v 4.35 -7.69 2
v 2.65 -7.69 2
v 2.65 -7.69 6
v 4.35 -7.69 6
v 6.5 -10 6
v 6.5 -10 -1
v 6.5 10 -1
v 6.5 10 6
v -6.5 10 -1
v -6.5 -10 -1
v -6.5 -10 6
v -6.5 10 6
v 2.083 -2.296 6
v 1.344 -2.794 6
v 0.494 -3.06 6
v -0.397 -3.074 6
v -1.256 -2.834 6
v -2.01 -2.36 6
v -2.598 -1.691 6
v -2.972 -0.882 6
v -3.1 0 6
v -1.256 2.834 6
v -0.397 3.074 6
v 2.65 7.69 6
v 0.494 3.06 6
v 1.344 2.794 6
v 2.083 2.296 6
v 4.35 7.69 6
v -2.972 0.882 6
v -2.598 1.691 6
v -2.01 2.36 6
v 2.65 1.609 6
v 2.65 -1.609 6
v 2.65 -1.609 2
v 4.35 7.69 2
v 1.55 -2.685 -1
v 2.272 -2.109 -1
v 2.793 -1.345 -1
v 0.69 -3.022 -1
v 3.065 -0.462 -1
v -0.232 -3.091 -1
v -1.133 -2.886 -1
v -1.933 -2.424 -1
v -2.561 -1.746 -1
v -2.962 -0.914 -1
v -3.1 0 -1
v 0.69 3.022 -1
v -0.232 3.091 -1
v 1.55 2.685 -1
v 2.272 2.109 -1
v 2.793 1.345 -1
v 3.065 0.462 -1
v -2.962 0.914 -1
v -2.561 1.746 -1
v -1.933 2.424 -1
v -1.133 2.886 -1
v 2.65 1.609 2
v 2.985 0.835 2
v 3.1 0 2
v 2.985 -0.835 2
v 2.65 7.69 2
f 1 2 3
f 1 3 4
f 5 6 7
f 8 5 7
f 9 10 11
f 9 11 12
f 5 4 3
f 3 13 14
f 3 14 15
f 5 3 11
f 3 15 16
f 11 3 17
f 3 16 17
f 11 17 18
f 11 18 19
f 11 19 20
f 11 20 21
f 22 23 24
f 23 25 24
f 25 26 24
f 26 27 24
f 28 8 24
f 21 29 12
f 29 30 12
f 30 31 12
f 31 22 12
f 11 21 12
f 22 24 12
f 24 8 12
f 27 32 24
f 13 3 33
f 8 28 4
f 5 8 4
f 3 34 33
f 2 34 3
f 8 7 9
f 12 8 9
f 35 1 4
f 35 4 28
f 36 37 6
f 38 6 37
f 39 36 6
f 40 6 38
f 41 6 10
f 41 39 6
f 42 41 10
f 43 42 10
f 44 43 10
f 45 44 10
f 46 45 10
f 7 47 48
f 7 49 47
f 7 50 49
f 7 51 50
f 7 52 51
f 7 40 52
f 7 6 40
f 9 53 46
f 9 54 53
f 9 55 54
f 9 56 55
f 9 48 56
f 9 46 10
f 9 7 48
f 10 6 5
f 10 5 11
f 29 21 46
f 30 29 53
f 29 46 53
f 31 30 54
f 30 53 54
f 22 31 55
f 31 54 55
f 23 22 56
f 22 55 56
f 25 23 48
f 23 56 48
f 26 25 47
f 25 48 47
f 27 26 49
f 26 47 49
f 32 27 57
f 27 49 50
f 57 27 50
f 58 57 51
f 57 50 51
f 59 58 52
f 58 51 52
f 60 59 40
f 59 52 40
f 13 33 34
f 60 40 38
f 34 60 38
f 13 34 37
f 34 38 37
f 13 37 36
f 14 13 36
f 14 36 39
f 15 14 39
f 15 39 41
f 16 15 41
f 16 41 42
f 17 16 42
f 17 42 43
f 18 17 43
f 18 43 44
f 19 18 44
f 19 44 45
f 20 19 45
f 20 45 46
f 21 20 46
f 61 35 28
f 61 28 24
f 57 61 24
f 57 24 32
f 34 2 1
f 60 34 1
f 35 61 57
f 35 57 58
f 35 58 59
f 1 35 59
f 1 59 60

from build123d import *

# Parameters (mm, degrees)
SKETCH2_W           = 13
SKETCH2_H           = 20
BOSS_EXTRUDE1_DEPTH = 6
BOSS_EXTRUDE2_DEPTH = 2
BOSS_EXTRUDE3_START = 1
SKETCH3_W           = 13
SKETCH3_H           = 20
SKETCH3_R           = 3.2
BOSS_EXTRUDE3_DEPTH = 1
BOSS_EXTRUDE4_DEPTH = 4
CUT_EXTRUDE1_START  = -6
CUT_EXTRUDE1_DEPTH  = 6
BOSS_EXTRUDE5_DEPTH = 2
SKETCH8_R           = 3.2
SKETCH8_R_2         = 3.1
BOSS_EXTRUDE6_DEPTH = 7
SKETCH9_W           = 1.7
SKETCH9_H           = 15.38
CUT_EXTRUDE2_DEPTH  = 4


# Read off the part's stored shape, not the designer's step: Cut-Extrude1
with BuildPart() as part:
    # Sketch2 → Boss-Extrude1 (new body)
    with BuildSketch(Plane.XY):
        Rectangle(SKETCH2_W, SKETCH2_H)
        with BuildLine():
            Line((1.3, -9.04), (1.3, -2.924038303))
            ThreePointArc((1.3, -2.924038303), (-3.2, 0), (1.3, 2.924038303))
            Line((1.3, 2.924038303), (1.3, 9.04))
            Line((1.3, 9.04), (5.7, 9.04))
            Line((5.7, 9.04), (5.7, -9.04))
            Line((5.7, -9.04), (1.3, -9.04))
        make_face(mode=Mode.SUBTRACT)
    extrude(amount=BOSS_EXTRUDE1_DEPTH)

    # Sketch2<3> → Boss-Extrude2 (add)
    with BuildSketch(Plane.XY):
        with BuildLine():
            Line((4.2, 7.54), (4.2, -7.54))
            Line((4.2, -7.54), (2.8, -7.54))
            Line((2.8, -7.54), (2.8, -1.549193338))
            ThreePointArc((2.8, -1.549193338), (2.162186317, -2.359014695), (1.3, -2.924038303))
            Line((1.3, -2.924038303), (1.3, -9.04))
            Line((1.3, -9.04), (5.7, -9.04))
            Line((5.7, -9.04), (5.7, 9.04))
            Line((5.7, 9.04), (1.3, 9.04))
            Line((1.3, 9.04), (1.3, 2.924038303))
            ThreePointArc((1.3, 2.924038303), (2.162186317, 2.359014695), (2.8, 1.549193338))
            Line((2.8, 1.549193338), (2.8, 7.54))
            Line((2.8, 7.54), (4.2, 7.54))
        make_face()
    extrude(amount=BOSS_EXTRUDE2_DEPTH)

    # Sketch3 → Boss-Extrude3 (add)
    with BuildSketch(Plane(origin=(0, 0, 0), x_dir=(-1, 0, 0), z_dir=(0, 0, -1)).offset(BOSS_EXTRUDE3_START)):
        Rectangle(SKETCH3_W, SKETCH3_H)
        Circle(SKETCH3_R, mode=Mode.SUBTRACT)
    extrude(amount=-BOSS_EXTRUDE3_DEPTH)

    # Sketch4 → Boss-Extrude4 (add)
    with BuildSketch(Plane.XY.offset(2)):
        with BuildLine():
            Line((2.8, 1.549193338), (2.8, 7.54))
            Line((2.8, 7.54), (4.2, 7.54))
            Line((4.2, 7.54), (4.2, -7.54))
            Line((4.2, -7.54), (2.8, -7.54))
            Line((2.8, -7.54), (2.8, -1.549193338))
            ThreePointArc((2.8, -1.549193338), (2.162186317, -2.359014695), (1.3, -2.924038303))
            Line((1.3, -2.924038303), (1.3, -9.04))
            Line((1.3, -9.04), (5.7, -9.04))
            Line((5.7, -9.04), (5.7, 9.04))
            Line((5.7, 9.04), (1.3, 9.04))
            Line((1.3, 9.04), (1.3, 2.924038303))
            ThreePointArc((1.3, 2.924038303), (2.162186317, 2.359014695), (2.8, 1.549193338))
        make_face()
    extrude(amount=BOSS_EXTRUDE4_DEPTH)

    # Cut-Extrude1 outline → Cut-Extrude1 (cut)
    with BuildSketch(Plane.XY.offset(6).offset(CUT_EXTRUDE1_START)):
        with BuildLine():
            Line((4.35, 7.69), (2.65, 7.69))
            Line((2.65, 7.69), (2.65, 1.793739111))
            ThreePointArc((2.65, 1.793739111), (2.727741861, 1.673148033), (2.8, 1.549193338))
            Line((2.8, 1.549193338), (2.8, 7.54))
            Line((2.8, 7.54), (4.2, 7.54))
            Line((4.2, 7.54), (4.2, -7.54))
            Line((4.2, -7.54), (2.8, -7.54))
            Line((2.8, -7.54), (2.8, -1.549193338))
            ThreePointArc((2.8, -1.549193338), (2.727741861, -1.673148033), (2.65, -1.793739111))
            Line((2.65, -1.793739111), (2.65, -7.69))
            Line((2.65, -7.69), (4.35, -7.69))
            Line((4.35, -7.69), (4.35, 7.69))
        make_face()
    extrude(amount=CUT_EXTRUDE1_DEPTH, mode=Mode.SUBTRACT)

    # Sketch7 → Boss-Extrude5 (add)
    with BuildSketch(Plane.XY):
        with BuildLine():
            Line((2.65, 7.69), (2.65, 1.793739111))
            ThreePointArc((2.65, 1.793739111), (3.2, 0), (2.65, -1.793739111))
            Line((2.65, -1.793739111), (2.65, -7.69))
            Line((2.65, -7.69), (4.35, -7.69))
            Line((4.35, -7.69), (4.35, 7.69))
            Line((4.35, 7.69), (2.65, 7.69))
        make_face()
    extrude(amount=BOSS_EXTRUDE5_DEPTH)

    # Sketch8 → Boss-Extrude6 (add)
    with BuildSketch(Plane(origin=(0, 0, -1), x_dir=(-1, 0, 0), z_dir=(0, 0, -1))):
        Circle(SKETCH8_R)
        Circle(SKETCH8_R_2, mode=Mode.SUBTRACT)
    extrude(amount=-BOSS_EXTRUDE6_DEPTH)

    # Sketch9 → Cut-Extrude2 (cut)
    with BuildSketch(Plane.XY.offset(6)):
        with Locations((3.5, 0)):
            Rectangle(SKETCH9_W, SKETCH9_H)
    extrude(amount=-CUT_EXTRUDE2_DEPTH, mode=Mode.SUBTRACT)


solid = part.part
